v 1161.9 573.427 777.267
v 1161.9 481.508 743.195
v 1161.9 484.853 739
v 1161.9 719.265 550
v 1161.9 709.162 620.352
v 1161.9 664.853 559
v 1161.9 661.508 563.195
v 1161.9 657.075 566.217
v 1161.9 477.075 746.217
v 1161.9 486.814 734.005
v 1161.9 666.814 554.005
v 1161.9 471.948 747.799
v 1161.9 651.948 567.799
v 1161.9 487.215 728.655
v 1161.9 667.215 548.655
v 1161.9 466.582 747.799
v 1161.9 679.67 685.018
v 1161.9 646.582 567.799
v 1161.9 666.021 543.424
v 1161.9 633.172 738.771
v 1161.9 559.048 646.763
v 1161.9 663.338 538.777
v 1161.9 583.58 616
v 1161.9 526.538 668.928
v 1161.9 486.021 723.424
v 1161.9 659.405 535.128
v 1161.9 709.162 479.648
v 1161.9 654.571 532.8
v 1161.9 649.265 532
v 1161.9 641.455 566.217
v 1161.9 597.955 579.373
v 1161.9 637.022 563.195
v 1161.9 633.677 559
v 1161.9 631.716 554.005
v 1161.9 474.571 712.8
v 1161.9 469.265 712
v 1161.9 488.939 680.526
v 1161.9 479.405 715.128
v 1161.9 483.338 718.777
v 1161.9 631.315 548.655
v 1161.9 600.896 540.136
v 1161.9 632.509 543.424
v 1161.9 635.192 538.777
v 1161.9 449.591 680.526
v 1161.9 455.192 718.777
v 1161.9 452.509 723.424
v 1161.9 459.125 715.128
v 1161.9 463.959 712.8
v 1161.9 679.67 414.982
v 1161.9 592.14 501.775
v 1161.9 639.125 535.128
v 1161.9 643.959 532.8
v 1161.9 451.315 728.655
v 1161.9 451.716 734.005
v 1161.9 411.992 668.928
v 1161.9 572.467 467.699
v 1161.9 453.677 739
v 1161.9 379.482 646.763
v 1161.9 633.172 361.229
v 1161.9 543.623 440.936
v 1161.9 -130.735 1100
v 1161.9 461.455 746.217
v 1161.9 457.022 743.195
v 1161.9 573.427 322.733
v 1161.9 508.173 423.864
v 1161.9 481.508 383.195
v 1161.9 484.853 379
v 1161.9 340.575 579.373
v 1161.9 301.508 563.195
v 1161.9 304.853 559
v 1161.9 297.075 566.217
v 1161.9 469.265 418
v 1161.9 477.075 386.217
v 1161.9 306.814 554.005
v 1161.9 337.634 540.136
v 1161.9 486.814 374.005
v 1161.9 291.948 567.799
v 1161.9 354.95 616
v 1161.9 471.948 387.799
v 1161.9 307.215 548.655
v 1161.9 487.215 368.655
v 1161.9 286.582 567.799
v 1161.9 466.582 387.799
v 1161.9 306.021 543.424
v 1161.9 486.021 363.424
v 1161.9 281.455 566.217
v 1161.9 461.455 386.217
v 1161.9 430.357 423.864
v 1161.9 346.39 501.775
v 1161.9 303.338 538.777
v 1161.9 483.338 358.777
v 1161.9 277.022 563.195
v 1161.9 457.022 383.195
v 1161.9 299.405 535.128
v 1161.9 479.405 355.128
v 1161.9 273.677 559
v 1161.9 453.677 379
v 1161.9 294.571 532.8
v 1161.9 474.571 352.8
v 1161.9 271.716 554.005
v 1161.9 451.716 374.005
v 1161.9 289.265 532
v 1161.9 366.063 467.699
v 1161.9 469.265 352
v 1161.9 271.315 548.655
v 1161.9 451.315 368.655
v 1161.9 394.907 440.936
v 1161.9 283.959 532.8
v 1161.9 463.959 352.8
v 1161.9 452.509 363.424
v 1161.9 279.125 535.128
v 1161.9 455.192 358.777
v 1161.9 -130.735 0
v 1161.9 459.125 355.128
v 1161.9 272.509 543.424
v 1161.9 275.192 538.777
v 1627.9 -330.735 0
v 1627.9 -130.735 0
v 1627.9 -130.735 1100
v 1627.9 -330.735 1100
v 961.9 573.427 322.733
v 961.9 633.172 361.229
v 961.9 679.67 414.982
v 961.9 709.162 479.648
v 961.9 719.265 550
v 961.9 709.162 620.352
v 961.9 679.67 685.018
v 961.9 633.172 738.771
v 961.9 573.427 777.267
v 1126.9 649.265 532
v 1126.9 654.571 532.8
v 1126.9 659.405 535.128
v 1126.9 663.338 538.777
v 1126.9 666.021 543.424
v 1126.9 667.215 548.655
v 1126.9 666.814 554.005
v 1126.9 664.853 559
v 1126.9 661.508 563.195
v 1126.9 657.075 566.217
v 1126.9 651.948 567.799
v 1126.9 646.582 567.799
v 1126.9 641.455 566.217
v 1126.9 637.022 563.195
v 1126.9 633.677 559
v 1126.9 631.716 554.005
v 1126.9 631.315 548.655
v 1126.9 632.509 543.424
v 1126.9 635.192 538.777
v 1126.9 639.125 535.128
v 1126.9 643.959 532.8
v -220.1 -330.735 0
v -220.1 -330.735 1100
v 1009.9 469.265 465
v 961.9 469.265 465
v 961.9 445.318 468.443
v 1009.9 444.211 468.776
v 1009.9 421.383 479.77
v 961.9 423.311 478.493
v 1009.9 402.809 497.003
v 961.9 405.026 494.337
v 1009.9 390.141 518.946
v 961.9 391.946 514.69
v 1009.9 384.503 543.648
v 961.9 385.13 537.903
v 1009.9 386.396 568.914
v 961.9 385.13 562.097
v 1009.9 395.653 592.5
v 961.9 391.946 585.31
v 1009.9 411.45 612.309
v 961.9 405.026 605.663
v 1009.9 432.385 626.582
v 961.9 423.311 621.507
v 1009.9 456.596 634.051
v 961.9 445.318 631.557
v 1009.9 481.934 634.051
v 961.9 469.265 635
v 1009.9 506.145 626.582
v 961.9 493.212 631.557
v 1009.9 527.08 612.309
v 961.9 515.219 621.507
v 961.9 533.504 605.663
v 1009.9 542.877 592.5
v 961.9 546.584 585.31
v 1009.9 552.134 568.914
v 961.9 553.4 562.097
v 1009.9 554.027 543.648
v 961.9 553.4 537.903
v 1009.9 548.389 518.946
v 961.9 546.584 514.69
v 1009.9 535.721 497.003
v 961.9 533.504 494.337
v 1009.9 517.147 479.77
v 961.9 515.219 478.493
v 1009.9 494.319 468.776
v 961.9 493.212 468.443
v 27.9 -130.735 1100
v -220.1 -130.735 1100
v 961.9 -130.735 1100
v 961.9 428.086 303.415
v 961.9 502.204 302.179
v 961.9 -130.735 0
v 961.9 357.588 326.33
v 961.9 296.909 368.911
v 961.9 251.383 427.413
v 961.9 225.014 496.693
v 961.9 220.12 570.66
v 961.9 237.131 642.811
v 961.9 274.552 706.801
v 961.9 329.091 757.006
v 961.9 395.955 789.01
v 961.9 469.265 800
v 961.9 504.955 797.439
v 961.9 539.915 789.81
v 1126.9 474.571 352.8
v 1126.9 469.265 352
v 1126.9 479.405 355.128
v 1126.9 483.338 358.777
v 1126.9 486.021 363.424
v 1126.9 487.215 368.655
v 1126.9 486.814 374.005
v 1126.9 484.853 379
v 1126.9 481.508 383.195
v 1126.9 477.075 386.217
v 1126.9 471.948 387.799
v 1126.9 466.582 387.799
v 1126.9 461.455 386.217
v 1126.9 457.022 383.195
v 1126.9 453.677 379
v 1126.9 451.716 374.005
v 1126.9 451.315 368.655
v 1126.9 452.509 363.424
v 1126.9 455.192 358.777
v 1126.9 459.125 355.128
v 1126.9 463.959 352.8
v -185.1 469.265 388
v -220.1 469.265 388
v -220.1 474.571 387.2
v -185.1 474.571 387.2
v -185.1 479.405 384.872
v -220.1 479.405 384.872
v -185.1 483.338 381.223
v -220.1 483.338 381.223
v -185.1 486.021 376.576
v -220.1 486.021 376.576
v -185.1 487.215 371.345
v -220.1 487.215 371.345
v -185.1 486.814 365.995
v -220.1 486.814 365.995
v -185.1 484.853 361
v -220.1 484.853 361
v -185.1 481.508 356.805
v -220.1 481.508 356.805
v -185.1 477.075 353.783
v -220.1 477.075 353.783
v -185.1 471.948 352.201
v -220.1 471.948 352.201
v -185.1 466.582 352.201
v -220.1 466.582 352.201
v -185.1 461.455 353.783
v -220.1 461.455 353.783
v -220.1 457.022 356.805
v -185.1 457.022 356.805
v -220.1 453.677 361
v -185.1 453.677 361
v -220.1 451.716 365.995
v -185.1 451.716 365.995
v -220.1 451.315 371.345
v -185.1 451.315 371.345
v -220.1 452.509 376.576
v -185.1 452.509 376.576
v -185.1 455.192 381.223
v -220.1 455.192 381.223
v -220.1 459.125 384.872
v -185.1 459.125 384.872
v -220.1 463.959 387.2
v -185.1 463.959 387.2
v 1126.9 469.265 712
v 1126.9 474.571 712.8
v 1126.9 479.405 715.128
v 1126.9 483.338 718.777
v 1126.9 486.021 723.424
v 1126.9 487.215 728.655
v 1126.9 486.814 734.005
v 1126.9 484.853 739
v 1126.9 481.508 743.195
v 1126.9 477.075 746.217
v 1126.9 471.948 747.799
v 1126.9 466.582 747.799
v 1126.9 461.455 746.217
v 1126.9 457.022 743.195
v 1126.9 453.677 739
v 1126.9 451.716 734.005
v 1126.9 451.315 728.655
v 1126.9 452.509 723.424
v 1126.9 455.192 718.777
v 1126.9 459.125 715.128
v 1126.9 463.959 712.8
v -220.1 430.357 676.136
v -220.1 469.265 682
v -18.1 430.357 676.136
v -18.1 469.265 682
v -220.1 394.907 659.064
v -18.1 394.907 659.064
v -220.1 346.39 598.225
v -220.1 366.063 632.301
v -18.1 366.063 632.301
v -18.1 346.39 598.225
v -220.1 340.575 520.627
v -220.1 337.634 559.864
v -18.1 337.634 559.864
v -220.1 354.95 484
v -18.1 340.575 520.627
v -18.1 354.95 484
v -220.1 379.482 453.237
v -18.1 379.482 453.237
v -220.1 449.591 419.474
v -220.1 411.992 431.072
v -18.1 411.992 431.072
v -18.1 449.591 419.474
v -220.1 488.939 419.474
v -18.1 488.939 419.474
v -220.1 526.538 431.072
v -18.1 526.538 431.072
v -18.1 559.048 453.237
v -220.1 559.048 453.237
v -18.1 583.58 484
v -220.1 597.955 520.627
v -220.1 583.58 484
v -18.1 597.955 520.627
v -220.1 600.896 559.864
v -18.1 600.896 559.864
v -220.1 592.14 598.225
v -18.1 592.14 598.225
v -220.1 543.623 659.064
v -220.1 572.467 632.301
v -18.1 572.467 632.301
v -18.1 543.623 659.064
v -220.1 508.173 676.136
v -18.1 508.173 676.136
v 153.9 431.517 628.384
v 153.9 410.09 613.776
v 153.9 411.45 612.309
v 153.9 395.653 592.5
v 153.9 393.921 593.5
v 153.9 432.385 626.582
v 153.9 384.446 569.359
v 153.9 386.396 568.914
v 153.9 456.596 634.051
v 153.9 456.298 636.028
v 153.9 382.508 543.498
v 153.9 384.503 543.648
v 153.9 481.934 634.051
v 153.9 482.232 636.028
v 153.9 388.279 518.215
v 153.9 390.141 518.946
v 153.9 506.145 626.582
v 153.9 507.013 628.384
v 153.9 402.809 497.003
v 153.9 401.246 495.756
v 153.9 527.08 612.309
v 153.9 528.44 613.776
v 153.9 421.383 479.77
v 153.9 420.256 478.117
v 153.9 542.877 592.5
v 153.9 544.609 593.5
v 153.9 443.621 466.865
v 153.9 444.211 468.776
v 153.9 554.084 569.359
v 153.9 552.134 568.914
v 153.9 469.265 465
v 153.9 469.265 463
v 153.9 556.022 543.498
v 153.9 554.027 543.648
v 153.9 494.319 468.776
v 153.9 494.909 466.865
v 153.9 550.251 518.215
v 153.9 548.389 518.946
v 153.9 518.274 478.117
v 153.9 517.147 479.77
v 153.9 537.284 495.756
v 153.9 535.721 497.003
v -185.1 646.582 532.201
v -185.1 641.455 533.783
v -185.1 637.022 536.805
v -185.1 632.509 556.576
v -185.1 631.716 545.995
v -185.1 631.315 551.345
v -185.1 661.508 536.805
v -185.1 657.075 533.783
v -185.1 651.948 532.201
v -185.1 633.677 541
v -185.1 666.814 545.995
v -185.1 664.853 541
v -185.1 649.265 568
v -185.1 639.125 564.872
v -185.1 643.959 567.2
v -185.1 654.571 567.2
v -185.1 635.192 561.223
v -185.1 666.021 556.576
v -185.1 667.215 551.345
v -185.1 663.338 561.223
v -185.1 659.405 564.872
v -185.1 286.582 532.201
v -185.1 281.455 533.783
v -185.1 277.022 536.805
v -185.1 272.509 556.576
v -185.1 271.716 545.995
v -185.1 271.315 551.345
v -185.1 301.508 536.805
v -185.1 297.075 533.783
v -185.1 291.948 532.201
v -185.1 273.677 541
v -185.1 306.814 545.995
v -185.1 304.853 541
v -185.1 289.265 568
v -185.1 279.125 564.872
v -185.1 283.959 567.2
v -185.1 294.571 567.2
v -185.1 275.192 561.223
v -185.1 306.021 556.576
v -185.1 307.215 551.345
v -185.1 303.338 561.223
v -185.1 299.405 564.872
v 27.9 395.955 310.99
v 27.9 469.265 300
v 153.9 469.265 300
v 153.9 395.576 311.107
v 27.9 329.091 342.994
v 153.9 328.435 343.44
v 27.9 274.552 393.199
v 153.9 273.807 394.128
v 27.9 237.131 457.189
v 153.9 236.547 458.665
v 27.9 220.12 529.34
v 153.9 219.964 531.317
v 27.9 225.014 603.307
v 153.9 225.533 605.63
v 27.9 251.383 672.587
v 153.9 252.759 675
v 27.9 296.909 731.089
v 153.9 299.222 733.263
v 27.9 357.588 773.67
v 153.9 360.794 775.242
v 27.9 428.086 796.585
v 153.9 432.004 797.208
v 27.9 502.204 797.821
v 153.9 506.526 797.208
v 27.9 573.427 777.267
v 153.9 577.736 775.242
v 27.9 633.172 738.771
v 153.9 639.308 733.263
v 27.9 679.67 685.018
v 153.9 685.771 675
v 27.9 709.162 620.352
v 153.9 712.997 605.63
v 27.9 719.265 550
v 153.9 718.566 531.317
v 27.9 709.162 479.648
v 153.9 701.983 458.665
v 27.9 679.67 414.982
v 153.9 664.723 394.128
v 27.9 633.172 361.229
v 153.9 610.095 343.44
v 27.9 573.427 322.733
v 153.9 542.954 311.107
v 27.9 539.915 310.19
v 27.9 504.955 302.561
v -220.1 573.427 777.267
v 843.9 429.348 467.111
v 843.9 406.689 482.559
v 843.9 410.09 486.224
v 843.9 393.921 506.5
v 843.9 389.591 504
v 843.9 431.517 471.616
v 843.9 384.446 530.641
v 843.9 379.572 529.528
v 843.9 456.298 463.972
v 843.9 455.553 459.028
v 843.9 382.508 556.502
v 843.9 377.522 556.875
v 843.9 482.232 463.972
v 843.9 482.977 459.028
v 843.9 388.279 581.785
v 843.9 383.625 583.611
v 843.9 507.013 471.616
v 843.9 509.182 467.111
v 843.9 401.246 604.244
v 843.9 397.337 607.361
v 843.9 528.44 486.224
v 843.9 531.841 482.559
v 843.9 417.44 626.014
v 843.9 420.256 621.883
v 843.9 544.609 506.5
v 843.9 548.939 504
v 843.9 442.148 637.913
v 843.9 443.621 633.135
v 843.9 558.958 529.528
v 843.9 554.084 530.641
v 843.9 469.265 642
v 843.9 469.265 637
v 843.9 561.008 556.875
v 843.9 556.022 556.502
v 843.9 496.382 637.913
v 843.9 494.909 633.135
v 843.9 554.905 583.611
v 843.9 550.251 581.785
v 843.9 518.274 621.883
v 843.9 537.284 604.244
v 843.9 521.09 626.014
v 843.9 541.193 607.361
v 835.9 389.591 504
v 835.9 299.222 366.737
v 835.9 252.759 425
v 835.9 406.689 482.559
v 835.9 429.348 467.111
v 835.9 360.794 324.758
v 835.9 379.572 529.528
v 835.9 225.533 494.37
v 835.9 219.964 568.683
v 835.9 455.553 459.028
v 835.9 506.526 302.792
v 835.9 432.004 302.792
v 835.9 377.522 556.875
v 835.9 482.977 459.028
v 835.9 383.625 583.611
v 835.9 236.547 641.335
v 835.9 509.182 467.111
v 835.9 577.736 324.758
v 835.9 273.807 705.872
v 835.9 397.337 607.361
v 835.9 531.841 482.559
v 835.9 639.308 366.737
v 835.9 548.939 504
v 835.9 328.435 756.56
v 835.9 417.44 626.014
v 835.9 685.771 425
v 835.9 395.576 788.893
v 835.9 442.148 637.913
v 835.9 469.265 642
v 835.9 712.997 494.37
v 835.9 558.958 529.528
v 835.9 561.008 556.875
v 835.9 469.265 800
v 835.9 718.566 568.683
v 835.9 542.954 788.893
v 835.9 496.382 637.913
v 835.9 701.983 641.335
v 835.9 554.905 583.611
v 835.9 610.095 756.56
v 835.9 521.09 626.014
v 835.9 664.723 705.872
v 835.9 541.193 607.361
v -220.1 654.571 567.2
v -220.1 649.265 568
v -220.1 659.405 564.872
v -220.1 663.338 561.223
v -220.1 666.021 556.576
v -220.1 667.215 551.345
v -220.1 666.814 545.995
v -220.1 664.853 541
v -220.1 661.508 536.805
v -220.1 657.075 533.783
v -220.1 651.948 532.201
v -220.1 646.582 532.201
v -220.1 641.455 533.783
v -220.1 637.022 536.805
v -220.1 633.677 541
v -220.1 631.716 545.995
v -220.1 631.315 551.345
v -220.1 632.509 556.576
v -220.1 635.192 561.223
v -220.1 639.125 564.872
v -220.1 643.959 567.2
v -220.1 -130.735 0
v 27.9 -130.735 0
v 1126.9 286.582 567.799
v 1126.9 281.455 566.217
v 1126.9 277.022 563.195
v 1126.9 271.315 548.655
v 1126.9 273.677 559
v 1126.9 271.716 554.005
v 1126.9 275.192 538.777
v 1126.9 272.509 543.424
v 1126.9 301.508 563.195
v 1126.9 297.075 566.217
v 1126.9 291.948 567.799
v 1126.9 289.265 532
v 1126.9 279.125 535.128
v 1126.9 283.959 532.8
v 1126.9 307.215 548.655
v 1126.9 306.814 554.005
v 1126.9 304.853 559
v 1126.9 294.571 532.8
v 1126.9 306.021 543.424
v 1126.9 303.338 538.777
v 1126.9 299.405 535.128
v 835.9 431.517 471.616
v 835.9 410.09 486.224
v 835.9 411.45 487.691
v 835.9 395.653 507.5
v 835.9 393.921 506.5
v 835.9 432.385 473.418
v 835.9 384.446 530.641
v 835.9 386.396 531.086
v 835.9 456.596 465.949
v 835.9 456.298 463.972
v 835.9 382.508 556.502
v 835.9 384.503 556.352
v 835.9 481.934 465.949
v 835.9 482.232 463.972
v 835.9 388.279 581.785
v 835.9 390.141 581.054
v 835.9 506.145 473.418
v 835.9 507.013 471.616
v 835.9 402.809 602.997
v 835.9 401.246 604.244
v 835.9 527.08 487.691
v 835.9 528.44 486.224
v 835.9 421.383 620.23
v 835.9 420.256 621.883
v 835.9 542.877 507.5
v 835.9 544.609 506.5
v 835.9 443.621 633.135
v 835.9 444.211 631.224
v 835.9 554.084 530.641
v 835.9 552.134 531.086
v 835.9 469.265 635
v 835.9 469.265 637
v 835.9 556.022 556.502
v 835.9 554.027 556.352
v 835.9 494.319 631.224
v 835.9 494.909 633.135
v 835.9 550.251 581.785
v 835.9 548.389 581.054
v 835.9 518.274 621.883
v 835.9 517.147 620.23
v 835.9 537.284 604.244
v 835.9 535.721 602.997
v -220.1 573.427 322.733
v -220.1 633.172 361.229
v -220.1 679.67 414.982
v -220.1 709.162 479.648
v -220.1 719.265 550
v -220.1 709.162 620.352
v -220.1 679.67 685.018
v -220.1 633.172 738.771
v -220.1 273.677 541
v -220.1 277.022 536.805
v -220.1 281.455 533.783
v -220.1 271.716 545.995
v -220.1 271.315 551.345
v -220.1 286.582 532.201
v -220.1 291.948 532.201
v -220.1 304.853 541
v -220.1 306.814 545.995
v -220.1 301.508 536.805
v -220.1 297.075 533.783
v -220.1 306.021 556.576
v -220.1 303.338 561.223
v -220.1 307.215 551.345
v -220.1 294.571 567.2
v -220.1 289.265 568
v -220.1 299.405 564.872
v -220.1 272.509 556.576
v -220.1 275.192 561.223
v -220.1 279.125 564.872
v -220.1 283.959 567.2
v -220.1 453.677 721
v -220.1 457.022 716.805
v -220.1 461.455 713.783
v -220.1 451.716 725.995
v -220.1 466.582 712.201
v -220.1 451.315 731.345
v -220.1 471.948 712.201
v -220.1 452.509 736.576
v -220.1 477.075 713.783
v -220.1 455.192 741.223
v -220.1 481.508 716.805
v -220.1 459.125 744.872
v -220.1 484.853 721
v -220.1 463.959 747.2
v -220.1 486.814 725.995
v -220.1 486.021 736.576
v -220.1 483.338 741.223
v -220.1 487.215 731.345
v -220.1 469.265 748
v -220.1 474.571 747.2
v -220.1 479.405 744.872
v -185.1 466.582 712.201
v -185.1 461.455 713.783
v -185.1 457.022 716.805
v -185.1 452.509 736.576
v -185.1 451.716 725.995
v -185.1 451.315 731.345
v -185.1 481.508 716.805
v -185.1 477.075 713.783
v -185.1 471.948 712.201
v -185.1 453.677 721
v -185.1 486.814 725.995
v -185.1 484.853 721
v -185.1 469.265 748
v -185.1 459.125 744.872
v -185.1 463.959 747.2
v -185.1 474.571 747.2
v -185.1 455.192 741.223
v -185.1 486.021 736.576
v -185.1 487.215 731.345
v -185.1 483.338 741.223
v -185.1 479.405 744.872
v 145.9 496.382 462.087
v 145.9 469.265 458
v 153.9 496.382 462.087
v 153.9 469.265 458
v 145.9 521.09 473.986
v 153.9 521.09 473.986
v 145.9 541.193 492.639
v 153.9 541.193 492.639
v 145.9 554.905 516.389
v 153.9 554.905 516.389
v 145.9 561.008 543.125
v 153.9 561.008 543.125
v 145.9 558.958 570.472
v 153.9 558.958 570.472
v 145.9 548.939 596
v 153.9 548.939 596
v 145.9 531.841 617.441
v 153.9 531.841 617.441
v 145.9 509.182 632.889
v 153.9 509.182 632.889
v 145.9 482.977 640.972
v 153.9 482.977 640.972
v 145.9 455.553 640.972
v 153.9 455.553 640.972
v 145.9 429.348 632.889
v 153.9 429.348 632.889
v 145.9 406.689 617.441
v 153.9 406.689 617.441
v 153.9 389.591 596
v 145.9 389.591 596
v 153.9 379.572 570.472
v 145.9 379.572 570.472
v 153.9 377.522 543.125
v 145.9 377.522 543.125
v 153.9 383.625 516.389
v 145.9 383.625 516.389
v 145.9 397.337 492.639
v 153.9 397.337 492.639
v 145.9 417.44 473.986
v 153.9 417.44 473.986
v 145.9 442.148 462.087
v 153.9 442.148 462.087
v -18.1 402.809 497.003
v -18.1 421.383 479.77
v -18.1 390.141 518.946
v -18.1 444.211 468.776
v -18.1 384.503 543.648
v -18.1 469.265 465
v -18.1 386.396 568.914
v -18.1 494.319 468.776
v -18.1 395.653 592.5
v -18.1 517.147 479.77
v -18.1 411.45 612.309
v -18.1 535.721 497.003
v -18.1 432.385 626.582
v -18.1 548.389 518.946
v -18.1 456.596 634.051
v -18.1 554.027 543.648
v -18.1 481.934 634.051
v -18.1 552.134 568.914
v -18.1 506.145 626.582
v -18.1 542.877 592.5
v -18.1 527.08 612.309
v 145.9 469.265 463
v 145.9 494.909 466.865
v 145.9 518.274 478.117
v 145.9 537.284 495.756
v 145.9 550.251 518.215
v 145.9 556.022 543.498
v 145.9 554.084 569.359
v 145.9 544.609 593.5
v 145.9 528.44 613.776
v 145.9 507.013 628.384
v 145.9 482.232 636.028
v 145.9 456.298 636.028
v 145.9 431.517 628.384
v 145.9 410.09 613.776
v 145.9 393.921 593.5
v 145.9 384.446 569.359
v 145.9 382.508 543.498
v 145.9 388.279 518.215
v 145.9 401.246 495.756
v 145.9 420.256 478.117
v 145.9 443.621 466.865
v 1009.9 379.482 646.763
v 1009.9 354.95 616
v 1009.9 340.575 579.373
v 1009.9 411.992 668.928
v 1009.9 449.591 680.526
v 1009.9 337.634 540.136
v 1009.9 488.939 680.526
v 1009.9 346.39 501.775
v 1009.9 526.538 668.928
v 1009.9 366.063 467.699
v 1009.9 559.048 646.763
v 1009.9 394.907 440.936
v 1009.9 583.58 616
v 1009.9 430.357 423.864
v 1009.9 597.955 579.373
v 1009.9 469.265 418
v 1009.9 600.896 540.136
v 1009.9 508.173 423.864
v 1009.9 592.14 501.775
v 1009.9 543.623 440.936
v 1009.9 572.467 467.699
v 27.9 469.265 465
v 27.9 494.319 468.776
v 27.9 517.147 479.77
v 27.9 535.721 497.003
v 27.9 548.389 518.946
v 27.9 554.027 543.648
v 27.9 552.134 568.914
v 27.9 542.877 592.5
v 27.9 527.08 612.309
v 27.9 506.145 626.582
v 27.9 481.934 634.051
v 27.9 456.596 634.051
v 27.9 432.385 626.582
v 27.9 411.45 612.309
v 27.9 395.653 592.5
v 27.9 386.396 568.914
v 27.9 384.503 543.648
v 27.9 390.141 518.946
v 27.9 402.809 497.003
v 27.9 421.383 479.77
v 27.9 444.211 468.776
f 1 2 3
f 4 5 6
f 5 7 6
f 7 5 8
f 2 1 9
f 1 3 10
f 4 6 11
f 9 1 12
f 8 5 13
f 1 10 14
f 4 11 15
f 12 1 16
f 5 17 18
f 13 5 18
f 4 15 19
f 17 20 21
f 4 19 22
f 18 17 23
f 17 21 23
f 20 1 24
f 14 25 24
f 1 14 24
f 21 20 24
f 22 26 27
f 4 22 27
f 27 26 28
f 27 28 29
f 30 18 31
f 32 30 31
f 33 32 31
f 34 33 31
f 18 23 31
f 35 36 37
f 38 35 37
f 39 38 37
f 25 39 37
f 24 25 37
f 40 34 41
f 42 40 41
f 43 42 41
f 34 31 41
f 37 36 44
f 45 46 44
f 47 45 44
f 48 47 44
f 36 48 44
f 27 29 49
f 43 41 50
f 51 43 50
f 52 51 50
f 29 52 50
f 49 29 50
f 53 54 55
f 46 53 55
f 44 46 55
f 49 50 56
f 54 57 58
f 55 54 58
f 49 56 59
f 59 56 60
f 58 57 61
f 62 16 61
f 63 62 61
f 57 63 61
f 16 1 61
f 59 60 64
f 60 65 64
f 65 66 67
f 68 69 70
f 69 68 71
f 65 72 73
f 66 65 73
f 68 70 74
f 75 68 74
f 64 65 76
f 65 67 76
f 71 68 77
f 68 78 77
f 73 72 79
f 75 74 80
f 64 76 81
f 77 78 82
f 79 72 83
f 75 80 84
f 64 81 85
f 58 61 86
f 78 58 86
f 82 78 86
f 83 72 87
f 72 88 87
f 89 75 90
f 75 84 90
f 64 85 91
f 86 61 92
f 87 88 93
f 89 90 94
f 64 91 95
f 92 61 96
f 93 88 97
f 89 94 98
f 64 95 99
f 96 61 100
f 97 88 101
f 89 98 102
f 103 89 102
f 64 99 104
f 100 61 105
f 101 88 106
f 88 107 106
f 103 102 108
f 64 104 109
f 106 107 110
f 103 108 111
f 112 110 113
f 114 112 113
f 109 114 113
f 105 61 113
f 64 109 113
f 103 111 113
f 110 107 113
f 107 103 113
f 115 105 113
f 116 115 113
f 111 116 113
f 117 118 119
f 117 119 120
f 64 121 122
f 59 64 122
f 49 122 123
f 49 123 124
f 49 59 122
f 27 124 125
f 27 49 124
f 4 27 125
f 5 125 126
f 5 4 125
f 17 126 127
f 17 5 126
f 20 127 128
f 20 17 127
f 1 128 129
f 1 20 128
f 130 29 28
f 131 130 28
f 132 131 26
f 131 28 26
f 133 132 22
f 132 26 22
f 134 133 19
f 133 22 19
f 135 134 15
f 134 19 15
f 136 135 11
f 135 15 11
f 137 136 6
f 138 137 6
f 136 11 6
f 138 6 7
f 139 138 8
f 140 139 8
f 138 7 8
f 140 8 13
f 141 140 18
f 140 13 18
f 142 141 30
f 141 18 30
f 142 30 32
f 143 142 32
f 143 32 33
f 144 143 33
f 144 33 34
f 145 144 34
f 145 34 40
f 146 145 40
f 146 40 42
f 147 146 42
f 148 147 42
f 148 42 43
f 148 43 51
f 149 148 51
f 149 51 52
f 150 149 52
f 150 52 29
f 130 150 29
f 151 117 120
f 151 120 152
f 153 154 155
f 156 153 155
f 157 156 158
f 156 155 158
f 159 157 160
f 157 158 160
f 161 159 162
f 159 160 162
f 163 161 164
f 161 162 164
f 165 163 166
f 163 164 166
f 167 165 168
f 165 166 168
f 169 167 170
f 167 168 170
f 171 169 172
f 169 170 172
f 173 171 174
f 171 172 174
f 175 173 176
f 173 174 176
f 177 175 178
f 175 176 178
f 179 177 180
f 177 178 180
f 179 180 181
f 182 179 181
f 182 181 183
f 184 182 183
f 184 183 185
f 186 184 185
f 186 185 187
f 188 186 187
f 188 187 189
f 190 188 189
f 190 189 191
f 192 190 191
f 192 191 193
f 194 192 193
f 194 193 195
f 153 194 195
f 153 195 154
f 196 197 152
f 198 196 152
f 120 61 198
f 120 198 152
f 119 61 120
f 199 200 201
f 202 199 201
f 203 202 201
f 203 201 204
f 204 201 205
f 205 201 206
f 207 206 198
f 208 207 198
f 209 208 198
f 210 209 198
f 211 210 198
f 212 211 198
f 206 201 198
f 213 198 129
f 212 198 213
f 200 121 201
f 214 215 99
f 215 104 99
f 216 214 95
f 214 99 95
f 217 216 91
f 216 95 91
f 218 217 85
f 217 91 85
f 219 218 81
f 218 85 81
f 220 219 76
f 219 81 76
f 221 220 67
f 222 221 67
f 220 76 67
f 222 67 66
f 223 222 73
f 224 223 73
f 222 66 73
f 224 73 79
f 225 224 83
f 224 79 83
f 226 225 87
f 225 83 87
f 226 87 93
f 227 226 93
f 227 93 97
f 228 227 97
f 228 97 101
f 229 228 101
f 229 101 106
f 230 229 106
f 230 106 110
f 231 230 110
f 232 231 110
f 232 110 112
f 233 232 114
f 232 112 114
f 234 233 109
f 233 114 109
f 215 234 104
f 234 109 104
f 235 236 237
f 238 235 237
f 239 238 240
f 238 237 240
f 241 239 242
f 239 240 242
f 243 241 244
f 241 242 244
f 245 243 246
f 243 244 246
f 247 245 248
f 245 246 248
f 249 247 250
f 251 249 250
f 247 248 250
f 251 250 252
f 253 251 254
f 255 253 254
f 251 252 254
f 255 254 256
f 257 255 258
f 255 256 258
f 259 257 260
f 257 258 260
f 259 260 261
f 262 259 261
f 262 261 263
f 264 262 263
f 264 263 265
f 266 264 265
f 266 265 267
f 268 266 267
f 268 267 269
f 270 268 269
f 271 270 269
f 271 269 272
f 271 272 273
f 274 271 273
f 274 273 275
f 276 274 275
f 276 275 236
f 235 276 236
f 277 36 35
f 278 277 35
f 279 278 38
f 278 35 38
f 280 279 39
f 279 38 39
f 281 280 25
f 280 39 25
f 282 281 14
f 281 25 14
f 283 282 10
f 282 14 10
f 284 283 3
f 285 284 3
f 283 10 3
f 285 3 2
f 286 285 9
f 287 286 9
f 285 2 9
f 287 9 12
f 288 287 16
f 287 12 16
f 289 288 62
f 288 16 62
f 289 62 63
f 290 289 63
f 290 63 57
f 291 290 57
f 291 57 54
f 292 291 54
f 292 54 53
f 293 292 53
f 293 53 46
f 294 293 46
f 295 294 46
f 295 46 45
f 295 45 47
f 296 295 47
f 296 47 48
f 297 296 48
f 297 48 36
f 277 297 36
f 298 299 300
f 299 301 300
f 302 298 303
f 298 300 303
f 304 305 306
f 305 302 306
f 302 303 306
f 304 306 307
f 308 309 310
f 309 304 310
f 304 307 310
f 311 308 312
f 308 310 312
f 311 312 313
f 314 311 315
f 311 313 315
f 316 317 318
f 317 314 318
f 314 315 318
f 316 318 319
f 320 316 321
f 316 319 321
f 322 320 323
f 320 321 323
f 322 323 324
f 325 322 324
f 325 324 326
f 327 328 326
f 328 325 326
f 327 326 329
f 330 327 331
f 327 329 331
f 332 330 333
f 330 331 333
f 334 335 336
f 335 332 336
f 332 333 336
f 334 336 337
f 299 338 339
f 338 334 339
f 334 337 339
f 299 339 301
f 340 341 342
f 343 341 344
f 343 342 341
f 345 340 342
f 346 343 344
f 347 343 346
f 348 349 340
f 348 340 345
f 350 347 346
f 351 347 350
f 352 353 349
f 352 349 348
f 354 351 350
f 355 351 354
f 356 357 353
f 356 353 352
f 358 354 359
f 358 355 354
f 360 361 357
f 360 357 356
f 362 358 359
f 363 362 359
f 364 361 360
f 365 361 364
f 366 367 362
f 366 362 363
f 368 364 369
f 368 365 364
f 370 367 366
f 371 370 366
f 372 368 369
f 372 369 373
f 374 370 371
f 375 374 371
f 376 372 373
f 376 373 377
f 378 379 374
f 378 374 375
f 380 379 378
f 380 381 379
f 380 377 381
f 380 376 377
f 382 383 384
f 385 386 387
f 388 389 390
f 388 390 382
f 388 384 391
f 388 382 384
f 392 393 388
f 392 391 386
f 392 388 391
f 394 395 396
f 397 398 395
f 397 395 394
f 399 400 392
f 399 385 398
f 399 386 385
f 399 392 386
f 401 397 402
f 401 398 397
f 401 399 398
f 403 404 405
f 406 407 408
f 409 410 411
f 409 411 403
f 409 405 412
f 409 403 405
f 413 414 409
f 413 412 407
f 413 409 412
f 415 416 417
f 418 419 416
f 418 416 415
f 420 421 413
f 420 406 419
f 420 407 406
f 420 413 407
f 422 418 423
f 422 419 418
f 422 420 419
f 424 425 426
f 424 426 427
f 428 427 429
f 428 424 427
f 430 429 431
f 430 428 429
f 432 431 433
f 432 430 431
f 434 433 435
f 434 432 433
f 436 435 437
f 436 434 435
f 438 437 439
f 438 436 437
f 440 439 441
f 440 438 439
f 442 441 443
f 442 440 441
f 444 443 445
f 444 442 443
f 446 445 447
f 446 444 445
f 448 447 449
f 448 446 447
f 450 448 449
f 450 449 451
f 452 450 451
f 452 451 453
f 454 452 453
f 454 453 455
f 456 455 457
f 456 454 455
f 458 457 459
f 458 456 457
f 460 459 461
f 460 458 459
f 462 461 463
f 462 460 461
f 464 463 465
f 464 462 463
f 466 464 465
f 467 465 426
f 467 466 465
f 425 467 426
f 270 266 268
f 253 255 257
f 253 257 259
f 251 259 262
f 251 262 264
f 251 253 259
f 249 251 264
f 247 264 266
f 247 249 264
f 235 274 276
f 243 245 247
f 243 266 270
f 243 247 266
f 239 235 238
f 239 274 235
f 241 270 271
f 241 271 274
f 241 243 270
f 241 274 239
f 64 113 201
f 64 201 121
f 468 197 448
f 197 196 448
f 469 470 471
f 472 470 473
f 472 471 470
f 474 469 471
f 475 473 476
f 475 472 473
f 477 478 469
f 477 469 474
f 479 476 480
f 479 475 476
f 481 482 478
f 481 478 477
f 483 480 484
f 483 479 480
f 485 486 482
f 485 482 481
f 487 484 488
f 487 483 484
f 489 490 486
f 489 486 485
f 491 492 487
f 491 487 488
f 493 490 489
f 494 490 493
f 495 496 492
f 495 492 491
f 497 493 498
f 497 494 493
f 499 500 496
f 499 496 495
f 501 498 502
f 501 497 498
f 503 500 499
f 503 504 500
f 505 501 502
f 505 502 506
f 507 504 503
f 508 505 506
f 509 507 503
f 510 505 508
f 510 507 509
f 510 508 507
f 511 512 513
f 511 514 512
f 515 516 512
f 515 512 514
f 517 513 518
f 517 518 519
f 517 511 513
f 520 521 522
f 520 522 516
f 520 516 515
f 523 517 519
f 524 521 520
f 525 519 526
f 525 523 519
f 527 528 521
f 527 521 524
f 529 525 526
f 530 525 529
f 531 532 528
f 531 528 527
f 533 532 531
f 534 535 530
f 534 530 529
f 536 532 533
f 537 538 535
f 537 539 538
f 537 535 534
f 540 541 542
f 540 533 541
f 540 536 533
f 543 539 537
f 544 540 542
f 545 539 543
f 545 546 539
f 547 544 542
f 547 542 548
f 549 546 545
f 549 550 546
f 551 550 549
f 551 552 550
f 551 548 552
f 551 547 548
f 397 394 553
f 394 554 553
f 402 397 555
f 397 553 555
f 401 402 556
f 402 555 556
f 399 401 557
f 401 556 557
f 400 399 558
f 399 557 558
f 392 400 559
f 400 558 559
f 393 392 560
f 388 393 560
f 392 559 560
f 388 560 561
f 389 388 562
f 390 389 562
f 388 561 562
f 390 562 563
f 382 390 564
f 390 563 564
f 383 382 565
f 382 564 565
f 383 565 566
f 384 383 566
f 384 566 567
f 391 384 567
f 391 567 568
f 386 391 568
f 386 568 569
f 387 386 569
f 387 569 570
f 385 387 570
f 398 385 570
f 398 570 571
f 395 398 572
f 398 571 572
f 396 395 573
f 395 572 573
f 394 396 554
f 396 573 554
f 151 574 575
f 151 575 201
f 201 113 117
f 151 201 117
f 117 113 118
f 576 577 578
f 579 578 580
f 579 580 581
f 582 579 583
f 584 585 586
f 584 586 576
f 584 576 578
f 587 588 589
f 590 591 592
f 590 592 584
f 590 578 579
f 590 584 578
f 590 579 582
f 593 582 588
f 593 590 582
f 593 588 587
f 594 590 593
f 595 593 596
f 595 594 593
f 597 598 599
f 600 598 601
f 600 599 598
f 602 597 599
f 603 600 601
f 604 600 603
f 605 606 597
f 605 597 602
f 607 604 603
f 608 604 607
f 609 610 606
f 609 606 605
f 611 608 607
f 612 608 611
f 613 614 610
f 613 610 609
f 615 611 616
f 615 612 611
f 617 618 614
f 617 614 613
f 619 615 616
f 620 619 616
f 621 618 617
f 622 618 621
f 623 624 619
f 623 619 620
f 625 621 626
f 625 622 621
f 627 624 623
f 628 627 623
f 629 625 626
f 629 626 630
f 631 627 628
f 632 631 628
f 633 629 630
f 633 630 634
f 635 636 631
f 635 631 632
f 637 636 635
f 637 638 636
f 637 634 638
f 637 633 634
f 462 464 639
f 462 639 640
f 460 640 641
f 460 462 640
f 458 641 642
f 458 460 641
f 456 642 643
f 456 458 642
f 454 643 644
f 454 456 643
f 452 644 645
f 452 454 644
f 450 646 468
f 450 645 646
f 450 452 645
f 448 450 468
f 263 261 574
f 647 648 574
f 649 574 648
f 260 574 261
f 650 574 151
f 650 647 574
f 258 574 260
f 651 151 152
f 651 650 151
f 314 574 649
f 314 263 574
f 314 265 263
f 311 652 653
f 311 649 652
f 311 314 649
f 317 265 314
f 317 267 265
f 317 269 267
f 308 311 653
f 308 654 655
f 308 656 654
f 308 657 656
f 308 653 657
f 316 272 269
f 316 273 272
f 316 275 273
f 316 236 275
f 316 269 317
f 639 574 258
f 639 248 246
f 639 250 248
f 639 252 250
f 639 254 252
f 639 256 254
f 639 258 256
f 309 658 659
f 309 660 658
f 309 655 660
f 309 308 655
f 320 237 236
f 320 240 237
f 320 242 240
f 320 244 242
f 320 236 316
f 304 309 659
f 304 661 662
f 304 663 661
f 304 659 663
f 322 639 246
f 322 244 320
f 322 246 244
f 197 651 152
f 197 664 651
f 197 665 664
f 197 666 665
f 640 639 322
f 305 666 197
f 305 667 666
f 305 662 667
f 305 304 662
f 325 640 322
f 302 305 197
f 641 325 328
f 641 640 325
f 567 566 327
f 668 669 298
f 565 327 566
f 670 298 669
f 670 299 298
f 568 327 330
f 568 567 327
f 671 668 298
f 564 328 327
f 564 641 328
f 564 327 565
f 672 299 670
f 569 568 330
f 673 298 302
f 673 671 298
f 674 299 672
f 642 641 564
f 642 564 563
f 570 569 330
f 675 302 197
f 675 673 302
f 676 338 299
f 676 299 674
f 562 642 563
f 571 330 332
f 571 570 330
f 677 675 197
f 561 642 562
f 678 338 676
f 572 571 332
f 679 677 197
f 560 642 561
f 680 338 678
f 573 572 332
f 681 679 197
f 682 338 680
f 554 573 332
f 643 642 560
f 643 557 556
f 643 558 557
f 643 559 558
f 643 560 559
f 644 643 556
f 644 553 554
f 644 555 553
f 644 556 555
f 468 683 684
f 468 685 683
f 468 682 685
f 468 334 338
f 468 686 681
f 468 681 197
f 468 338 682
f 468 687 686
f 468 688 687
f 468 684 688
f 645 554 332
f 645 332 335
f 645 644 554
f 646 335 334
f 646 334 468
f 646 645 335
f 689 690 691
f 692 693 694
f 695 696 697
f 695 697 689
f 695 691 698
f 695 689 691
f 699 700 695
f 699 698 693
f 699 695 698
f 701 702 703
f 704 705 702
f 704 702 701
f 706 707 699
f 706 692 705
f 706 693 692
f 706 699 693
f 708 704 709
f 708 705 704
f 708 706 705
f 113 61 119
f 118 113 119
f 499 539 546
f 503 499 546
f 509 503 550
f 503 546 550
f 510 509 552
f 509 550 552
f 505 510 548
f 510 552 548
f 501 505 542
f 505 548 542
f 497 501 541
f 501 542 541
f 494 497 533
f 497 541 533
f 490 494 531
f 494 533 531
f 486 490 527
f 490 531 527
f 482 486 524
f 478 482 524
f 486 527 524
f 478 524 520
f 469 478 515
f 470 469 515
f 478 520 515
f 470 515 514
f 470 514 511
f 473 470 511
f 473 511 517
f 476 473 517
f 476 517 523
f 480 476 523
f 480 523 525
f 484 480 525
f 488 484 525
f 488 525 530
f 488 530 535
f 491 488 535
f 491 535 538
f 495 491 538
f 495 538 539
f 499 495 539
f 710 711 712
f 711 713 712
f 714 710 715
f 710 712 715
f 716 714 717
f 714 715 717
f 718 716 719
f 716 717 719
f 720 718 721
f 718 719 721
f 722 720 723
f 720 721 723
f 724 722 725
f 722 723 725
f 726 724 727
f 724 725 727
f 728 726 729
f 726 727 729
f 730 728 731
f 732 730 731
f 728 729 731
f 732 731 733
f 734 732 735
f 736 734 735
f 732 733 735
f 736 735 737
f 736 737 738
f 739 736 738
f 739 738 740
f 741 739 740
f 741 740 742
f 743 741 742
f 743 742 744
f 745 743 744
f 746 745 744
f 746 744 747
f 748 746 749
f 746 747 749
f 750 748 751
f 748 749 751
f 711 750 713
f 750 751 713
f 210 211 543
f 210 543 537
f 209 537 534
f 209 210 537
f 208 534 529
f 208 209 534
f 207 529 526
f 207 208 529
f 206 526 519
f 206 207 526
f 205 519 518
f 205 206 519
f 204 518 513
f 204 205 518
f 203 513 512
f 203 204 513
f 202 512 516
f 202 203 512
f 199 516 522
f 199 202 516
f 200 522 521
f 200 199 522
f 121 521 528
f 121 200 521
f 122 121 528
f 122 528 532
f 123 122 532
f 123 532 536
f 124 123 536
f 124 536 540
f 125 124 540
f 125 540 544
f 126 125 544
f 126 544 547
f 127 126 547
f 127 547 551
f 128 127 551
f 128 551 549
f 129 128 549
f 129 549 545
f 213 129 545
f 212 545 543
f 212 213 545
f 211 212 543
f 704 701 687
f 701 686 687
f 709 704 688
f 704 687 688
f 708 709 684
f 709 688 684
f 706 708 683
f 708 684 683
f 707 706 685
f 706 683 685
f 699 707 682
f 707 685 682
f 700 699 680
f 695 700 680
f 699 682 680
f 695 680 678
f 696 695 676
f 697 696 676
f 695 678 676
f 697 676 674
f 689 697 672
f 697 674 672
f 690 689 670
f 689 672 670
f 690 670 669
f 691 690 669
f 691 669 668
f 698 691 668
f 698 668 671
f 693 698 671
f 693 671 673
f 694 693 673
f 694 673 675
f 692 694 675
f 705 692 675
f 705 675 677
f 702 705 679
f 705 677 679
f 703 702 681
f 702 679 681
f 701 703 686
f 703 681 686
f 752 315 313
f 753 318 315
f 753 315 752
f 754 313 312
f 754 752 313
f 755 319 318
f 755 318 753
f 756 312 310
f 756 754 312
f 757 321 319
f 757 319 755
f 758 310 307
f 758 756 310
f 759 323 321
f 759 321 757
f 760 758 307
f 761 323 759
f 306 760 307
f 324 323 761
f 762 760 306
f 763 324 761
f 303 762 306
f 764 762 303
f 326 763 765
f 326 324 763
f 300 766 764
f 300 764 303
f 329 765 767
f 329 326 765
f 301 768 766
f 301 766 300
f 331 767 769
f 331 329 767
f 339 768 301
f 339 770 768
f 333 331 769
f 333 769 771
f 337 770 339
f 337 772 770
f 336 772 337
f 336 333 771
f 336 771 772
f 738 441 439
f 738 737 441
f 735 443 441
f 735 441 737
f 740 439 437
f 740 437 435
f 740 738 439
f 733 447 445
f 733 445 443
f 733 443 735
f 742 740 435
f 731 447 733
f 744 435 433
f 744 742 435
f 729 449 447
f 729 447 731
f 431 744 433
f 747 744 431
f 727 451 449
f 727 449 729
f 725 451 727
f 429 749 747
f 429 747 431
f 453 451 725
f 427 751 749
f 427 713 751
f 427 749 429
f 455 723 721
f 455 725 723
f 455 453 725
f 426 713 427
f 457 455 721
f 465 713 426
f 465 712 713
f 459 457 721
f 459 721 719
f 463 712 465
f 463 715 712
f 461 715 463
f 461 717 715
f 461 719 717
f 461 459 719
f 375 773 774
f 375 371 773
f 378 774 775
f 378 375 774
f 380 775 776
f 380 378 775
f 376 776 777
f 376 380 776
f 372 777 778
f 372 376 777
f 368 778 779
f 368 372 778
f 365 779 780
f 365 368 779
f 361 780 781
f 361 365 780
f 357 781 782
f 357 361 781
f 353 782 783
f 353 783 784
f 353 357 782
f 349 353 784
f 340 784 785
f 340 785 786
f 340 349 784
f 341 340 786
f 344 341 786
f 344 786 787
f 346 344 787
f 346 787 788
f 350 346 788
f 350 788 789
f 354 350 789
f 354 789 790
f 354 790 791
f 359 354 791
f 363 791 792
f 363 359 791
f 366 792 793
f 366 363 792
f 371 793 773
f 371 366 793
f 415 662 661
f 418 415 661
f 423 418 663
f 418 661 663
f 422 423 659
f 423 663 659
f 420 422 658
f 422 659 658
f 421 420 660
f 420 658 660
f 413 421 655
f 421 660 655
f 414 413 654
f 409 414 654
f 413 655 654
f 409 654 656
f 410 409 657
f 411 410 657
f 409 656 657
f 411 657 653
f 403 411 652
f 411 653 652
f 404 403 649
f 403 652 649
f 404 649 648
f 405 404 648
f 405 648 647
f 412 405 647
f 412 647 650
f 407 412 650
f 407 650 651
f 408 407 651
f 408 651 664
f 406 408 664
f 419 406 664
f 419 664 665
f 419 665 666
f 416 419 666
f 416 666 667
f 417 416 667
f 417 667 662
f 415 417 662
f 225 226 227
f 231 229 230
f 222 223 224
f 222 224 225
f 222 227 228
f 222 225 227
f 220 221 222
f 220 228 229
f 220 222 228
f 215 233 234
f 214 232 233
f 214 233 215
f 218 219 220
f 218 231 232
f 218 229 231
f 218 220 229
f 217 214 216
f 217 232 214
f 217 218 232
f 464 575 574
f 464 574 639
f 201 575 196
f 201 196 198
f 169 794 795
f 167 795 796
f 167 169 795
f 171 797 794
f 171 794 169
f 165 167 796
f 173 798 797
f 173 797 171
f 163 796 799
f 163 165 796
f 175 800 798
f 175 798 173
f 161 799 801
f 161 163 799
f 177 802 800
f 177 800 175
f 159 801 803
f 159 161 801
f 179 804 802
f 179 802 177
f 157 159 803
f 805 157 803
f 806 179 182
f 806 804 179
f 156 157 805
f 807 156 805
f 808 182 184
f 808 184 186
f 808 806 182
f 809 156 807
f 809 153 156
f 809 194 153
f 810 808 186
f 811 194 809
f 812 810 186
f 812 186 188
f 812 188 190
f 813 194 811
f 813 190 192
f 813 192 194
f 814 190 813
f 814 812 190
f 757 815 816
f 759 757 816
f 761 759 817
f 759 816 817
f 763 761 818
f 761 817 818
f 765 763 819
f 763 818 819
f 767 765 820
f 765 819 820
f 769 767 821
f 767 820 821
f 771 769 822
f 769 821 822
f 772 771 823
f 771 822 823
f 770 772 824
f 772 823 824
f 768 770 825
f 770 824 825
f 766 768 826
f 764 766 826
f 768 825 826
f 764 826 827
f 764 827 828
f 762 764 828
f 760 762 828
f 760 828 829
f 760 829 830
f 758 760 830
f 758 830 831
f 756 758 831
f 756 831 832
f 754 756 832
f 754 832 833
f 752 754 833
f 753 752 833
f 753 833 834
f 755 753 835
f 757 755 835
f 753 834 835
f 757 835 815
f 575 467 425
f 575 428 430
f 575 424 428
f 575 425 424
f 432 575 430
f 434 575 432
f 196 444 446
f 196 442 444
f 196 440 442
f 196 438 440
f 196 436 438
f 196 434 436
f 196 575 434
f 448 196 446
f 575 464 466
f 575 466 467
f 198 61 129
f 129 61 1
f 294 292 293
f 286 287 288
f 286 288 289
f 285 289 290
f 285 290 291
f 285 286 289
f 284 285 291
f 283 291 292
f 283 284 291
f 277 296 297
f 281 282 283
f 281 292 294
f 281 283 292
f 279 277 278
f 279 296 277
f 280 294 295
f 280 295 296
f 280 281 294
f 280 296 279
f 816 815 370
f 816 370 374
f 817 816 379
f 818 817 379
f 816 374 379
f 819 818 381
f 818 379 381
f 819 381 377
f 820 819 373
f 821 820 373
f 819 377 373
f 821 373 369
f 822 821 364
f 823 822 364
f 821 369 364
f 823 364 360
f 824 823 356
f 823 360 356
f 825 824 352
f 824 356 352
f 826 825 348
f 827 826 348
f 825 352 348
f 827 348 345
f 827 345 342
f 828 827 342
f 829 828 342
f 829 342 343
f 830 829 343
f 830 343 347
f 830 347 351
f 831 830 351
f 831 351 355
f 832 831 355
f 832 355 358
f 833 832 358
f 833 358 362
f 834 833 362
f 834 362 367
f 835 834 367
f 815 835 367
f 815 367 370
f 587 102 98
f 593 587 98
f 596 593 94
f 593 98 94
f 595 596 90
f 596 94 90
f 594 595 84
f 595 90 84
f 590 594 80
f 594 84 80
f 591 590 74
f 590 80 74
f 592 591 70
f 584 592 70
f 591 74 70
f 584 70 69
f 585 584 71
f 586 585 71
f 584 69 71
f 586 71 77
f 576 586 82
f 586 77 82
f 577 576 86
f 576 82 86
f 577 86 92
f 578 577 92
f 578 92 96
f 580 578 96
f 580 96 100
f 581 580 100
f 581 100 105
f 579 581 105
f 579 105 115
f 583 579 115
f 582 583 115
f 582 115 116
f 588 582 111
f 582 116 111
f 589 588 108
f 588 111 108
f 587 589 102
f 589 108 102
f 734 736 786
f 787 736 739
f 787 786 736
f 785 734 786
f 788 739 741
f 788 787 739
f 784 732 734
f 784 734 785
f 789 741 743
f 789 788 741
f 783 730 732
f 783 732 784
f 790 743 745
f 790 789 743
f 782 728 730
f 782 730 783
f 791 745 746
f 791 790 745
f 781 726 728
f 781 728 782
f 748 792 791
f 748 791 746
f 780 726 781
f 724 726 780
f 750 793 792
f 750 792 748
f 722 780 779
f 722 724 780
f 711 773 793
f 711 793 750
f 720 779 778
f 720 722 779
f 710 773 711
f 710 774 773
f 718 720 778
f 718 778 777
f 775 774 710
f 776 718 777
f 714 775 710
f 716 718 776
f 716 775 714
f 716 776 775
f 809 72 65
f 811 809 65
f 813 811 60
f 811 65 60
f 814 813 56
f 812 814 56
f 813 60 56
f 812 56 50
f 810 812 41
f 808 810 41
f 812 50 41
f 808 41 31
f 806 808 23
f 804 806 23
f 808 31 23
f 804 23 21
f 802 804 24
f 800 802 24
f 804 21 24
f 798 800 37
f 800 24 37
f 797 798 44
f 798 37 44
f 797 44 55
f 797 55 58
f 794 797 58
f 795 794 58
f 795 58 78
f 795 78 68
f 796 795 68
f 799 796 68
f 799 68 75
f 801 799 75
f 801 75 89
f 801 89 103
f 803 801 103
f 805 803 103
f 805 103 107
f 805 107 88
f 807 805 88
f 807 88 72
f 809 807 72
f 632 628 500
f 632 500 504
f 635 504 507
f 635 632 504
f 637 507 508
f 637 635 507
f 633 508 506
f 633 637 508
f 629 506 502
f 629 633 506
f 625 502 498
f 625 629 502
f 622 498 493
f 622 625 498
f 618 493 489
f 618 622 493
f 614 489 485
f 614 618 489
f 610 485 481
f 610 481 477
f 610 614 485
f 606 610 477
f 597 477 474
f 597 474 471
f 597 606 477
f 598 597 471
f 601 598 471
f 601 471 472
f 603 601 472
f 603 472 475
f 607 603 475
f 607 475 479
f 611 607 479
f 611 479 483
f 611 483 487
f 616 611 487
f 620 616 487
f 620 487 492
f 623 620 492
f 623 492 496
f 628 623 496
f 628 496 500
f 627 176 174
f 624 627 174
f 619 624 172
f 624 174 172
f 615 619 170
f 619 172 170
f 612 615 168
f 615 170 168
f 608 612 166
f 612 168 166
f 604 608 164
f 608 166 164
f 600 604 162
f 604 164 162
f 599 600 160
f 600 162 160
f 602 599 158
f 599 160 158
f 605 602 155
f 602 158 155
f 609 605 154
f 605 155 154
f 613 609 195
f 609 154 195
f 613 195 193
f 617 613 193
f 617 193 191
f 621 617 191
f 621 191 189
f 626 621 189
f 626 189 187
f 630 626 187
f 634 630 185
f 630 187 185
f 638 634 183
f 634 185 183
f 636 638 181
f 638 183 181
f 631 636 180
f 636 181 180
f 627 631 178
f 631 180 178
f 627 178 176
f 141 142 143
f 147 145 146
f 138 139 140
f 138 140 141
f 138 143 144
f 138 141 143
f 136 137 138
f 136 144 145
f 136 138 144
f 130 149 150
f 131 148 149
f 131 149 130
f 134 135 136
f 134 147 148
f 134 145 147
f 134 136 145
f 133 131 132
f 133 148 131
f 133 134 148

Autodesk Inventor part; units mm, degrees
ref_plane "YZ Plane" through (0, 0, 0) normal (1, 0, 0) x (0, 1, 0)
ref_plane "XZ Plane" through (0, 0, 0) normal (0, 1, 0) x (-1, 0, 0)
ref_plane "XY Plane" through (0, 0, 0) normal (0, 0, 1) x (1, 0, 0)
sketch "Szkic1" plane through (0, 0, 0) normal (0, 0, 1) x (1, 0, 0)
  line L0 (-172.0995, -130.735) -> (1627.9005, -130.735)
  line L1 (1627.9005, -130.735) -> (1627.9005, -330.735)
  line L2 (1627.9005, -330.735) -> (-172.0995, -330.735)
  line L3 (-172.0995, -330.735) -> (-172.0995, -130.735)
  dimension "d6" = 1800
  dimension "d7" = 200
extrude "Wyciągnięcie proste1" add sketch "Szkic1" along normal blind 1100
sketch "Szkic2" plane through (-172.0995, -130.735, 0) normal (0, 1, 0) x (1, 0, 0)
  point P0 (172.0995, 0)
sketch "Szkic3" plane through (-172.0995, -130.735, 0) normal (0, 1, 0) x (1, 0, 0)
  line L0 (0, 0) -> (1800, 0) projected
  line L1 (0, -1100) -> (1800, -1100) projected
  line L2 (0, 0) -> (200, 0)
  line L3 (200, 0) -> (200, -1100)
  line L4 (200, -1100) -> (0, -1100)
  line L5 (0, -1100) -> (0, 0)
  line L6 (1800, 0) -> (1700, 0)
  line L7 (1700, -1100) -> (1800, -1100)
  line L8 (1334, 0) -> (1134, 0)
  line L9 (1134, 0) -> (1134, -1100)
  line L10 (1134, -1100) -> (1334, -1100)
  line L11 (1334, -1100) -> (1334, 0)
  line L12 (100, 0) -> (100, -1100)
  line L13 (1234, 0) -> (1234, -1100) construction
  point P0 (172.0995, 0)
  point P1 (1134, 0)
  dimension "d10" = 200
  dimension "d15" = 200
  dimension "d21" = 934
extrude "Wyciągnięcie proste2" add sketch "Szkic3" along normal blind 1200 contours L0 L12 L1 L5 | L0 L3 L1 L12 | L0 L11 L1 L9
sketch "Szkic6" plane through (27.9005, -130.735, 1100) normal (1, 0, 0) x (0, 0, -1)
  line L0 (0, 1200) -> (1100, 1200) projected
  line L1 (550, 1200) -> (550, 0)
  line L2 (1100, 0) -> (0, 0) projected
  line L3 (0, 0) -> (0, 1200) projected
  line L4 (0, 600) -> (1100, 600)
  line L5 (1100, 0) -> (1100, 1200) projected
  circle A0 centre (550, 600) radius 85
  point P0 (1100, 130.735)
  dimension "d23" = 170
extrude "Wyciągnięcie proste4" cut sketch "Szkic6" along normal blind 982 and the other way blind 46 contours A0 L4 L1 | L1 L4 A0 | L4 L1 A0 | L4 A0 L1
sketch "Szkic7" plane through (1161.9005, -130.735, 1100) normal (1, 0, 0) x (0, 0, -1)
  point P0 (1100, 130.735)
sketch "Szkic8" plane through (1161.9005, -130.735, 1100) normal (1, 0, 0) x (0, 0, -1)
  circle A0 centre (550, 600) radius 85 projected
  circle A1 centre (550, 600) radius 132
  point P0 (1100, 130.735)
  dimension "d28" = 264
extrude "Wyciągnięcie proste5" cut sketch "Szkic8" against normal up to surface (152 mm away) contours A0 | A1
sketch "Szkic9" plane through (-172.0995, -330.735, 0) normal (-1, 0, 0) x (0, 0, 1)
  circle A0 centre (550, 800) radius 85 projected
  circle A1 centre (550, 800) radius 132
  point P0 (0, 330.735)
extrude "Wyciągnięcie proste6" cut sketch "Szkic9" against normal up to surface (154 mm away) contours A0 | A1
sketch "Szkic10" plane through (1161.9005, -130.735, 1100) normal (1, 0, 0) x (0, 0, -1)
  line L0 (1100, 1200) -> (0, 1200) projected
  line L1 (1100, 0) -> (0, 0) projected
  line L2 (0, -200) -> (0, 1200) projected
  circle A0 centre (550, 600) radius 250
  line L3 (0, 0) -> (322.7328, 704.1616)
  line L4 (1100, 0) -> (777.2672, 704.1616)
  line L5 (0, 0) -> (0, 1200)
  line L6 (0, 1200) -> (1100, 1200)
  line L7 (1100, -200) -> (1100, 1200) projected
  line L8 (1100, 1200) -> (1100, 0)
  point P0 (1100, 130.735)
  dimension "d33" = 500
extrude "Wyciągnięcie proste7" cut sketch "Szkic10" against normal through all contours L7 L4 A0 L3 L2 L0
sketch "Szkic11" plane through (-172.0995, -330.735, 0) normal (-1, 0, 0) x (0, 0, 1)
  circle A0 centre (550, 800) radius 132
  circle A1 centre (550, 800) radius 85 projected
  circle A2 centre (550, 800) radius 250
  line L0 (0, 200) -> (1100, 200) projected
  line L1 (0, 0) -> (1100, 0)
  line L2 (1100, 0) -> (1100, 200)
  line L3 (1100, 200) -> (0, 200)
  line L4 (0, 200) -> (0, 0)
  line L5 (1100, 200) -> (777.2672, 904.1616) projected
  line L6 (1100, 200) -> (777.2672, 904.1616)
  line L7 (322.7328, 904.1616) -> (0, 200) projected
  line L8 (0, 200) -> (322.7328, 904.1616)
  point P0 (0, 330.735)
extrude "Wyciągnięcie proste8" add sketch "Szkic11" along normal blind 48 contours A2 | A2 L5 L0 L7 | L2 L1 L4 L0
sketch "Szkic12" plane through (-220.0995, -330.735, 0) normal (-1, 0, 0) x (0, 0, 1)
  point P0 (0, 330.735)
sketch "Szkic13" plane through (-18.0995, 469.265, 550) normal (-1, 0, 0) x (0, 0, 1)
  point P0 (-550, -469.265)
ref_plane "Płaszczyzna konstrukcyjna1" through (-220.0995, -330.735, 0) normal (-1, 0, 0) x (0, 0, 1)
sketch "Szkic14" plane through (-220.0995, -330.735, 0) normal (-1, 0, 0) x (0, 0, 1)
  point P0 (0, 330.735)
sketch "Szkic15" plane through (-220.0995, -330.735, 0) normal (-1, 0, 0) x (0, 0, 1)
  point P0 (0, 330.735)
sketch "Szkic16" plane through (-220.0995, -330.735, 0) normal (-1, 0, 0) x (0, 0, 1)
  circle A0 centre (550, 980) radius 18
  point P0 (0, 330.735)
  dimension "d39" = 36
extrude "Wyciągnięcie proste9" cut sketch "Szkic16" against normal blind 35
sketch "Szkic18" plane through (-220.0995, -330.735, 0) normal (-1, 0, 0) x (0, 0, 1)
  circle A0 centre (550, 620) radius 18
  circle A1 centre (370, 800) radius 18
  point P0 (0, 330.735)
  dimension "d43" = 36
  dimension "d44" = 36
extrude "Wyciągnięcie proste10" cut sketch "Szkic18" against normal blind 35
thread "Gwint1" size "M36x4" class "6H" standard "ANSI Metric M Profile" full length
thread "Gwint2" size "M36x4" class "6H" standard "ANSI Metric M Profile" full length
thread "Gwint3" size "M36x4" class "6H" standard "ANSI Metric M Profile" full length
sketch "Szkic19" plane through (-220.0995, -330.735, 0) normal (-1, 0, 0) x (0, 0, 1)
  circle A0 centre (730, 800) radius 18
  point P0 (0, 330.735)
  dimension "d57" = 36
extrude "Wyciągnięcie proste12" cut sketch "Szkic19" against normal blind 35
thread "Gwint5" size "M36x4" class "6H" standard "ANSI Metric M Profile" full length
sketch "Szkic20" plane through (27.9005, -130.735, 1100) normal (1, 0, 0) x (0, 0, -1)
  point P0 (1100, 130.735)
sketch "Szkic26" plane through (961.9005, -130.735, 0) normal (-1, 0, 0) x (0, 0, 1)
  circle A0 centre (550, 600) radius 85 projected
  circle A1 centre (550, 600) radius 250
  point P0 (0, 130.735)
extrude "Wyciągnięcie proste15" add sketch "Szkic26" along normal blind 126
sketch "Szkic27" plane through (835.9005, 469.265, 550) normal (-1, 0, 0) x (0, 0, 1)
  circle A0 centre (0, 0) radius 87
  circle A1 centre (0, 0) radius 92
  point P0 (-550, -469.265)
  dimension "d71" = 174
  dimension "d72" = 184
extrude "Wyciągnięcie proste16" cut sketch "Szkic27" against normal blind 8
sketch "Szkic28" plane through (-220.0995, -330.735, 0) normal (-1, 0, 0) x (0, 0, 1)
  point P0 (0, 330.735)
sketch "Szkic29" plane through (1161.9005, -130.735, 1100) normal (1, 0, 0) x (0, 0, -1)
  circle A0 centre (550, 780) radius 18 projected
  circle A1 centre (550, 780) radius 18
  circle A2 centre (730, 600) radius 18 projected
  circle A3 centre (730, 600) radius 18
  circle A4 centre (550, 420) radius 18 projected
  circle A5 centre (550, 420) radius 18
  circle A6 centre (370, 600) radius 18 projected
  circle A7 centre (370, 600) radius 18
  point P0 (1100, 130.735)
  dimension "d75" = 36
  dimension "d76" = 36
  dimension "d77" = 36
  dimension "d78" = 36
extrude "Wyciągnięcie proste17" cut sketch "Szkic29" against normal blind 35
thread "Gwint6" size "M36x4" class "6H" standard "ANSI Metric M Profile" full length
thread "Gwint7" size "M36x4" class "6H" standard "ANSI Metric M Profile" full length
thread "Gwint8" size "M36x4" class "6H" standard "ANSI Metric M Profile" full length
thread "Gwint9" size "M36x4" class "6H" standard "ANSI Metric M Profile" full length
sketch "Szkic30" plane through (27.9005, -130.735, 1100) normal (1, 0, 0) x (0, 0, -1)
  circle A0 centre (550, 600) radius 250
  point P0 (1100, 130.735)
  dimension "d89" = 500
extrude "Wyciągnięcie proste18" add sketch "Szkic30" along normal blind 126
sketch "Szkic31" plane through (153.9005, 469.265, 550) normal (1, 0, 0) x (0, 0, -1)
  point P0 (550, -469.265)
sketch "Szkic32" plane through (153.9005, 469.265, 550) normal (1, 0, 0) x (0, 0, -1)
  circle A0 centre (0, 0) radius 85 projected
  circle A1 centre (0, 0) radius 85
  point P0 (550, -469.265)
  dimension "d92" = 170
extrude "Wyciągnięcie proste19" cut sketch "Szkic32" against normal blind 400
sketch "Szkic33" plane through (153.9005, 469.265, 550) normal (1, 0, 0) x (0, 0, -1)
  circle A0 centre (0, 0) radius 87
  circle A1 centre (0, 0) radius 92
  point P0 (550, -469.265)
  dimension "d95" = 174
  dimension "d96" = 184
extrude "Wyciągnięcie proste20" cut sketch "Szkic33" against normal blind 8
properties part number "podstawa"
